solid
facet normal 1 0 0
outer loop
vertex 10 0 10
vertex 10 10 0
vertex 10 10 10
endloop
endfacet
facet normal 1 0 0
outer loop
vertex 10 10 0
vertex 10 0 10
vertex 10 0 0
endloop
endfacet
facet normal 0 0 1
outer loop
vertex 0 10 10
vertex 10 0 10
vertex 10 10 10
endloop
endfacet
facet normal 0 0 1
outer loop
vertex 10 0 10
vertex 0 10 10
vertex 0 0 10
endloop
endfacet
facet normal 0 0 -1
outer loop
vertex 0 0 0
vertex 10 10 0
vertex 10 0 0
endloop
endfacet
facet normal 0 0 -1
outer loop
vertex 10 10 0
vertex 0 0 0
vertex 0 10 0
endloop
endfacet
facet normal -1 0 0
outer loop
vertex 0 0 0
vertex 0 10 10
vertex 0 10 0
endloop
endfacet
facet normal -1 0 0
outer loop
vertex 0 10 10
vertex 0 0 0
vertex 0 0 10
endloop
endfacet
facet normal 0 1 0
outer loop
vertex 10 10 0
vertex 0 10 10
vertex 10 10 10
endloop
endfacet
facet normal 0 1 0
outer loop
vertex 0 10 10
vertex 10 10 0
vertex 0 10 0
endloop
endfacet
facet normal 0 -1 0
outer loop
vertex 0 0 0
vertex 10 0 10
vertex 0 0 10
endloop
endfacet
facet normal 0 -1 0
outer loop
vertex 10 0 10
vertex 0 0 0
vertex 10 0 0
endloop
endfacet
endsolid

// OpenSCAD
union(fillet = 2) {
    cube(10);
    translate([5, 5, 5]) sphere(5);
}

difference(fillet = -1) {
    cube(10);
    translate([5, 5, -1]) cylinder(h = 12, r = 2);
}

intersection(fillet = 0) {
    cube(10);
    sphere(8);
}
